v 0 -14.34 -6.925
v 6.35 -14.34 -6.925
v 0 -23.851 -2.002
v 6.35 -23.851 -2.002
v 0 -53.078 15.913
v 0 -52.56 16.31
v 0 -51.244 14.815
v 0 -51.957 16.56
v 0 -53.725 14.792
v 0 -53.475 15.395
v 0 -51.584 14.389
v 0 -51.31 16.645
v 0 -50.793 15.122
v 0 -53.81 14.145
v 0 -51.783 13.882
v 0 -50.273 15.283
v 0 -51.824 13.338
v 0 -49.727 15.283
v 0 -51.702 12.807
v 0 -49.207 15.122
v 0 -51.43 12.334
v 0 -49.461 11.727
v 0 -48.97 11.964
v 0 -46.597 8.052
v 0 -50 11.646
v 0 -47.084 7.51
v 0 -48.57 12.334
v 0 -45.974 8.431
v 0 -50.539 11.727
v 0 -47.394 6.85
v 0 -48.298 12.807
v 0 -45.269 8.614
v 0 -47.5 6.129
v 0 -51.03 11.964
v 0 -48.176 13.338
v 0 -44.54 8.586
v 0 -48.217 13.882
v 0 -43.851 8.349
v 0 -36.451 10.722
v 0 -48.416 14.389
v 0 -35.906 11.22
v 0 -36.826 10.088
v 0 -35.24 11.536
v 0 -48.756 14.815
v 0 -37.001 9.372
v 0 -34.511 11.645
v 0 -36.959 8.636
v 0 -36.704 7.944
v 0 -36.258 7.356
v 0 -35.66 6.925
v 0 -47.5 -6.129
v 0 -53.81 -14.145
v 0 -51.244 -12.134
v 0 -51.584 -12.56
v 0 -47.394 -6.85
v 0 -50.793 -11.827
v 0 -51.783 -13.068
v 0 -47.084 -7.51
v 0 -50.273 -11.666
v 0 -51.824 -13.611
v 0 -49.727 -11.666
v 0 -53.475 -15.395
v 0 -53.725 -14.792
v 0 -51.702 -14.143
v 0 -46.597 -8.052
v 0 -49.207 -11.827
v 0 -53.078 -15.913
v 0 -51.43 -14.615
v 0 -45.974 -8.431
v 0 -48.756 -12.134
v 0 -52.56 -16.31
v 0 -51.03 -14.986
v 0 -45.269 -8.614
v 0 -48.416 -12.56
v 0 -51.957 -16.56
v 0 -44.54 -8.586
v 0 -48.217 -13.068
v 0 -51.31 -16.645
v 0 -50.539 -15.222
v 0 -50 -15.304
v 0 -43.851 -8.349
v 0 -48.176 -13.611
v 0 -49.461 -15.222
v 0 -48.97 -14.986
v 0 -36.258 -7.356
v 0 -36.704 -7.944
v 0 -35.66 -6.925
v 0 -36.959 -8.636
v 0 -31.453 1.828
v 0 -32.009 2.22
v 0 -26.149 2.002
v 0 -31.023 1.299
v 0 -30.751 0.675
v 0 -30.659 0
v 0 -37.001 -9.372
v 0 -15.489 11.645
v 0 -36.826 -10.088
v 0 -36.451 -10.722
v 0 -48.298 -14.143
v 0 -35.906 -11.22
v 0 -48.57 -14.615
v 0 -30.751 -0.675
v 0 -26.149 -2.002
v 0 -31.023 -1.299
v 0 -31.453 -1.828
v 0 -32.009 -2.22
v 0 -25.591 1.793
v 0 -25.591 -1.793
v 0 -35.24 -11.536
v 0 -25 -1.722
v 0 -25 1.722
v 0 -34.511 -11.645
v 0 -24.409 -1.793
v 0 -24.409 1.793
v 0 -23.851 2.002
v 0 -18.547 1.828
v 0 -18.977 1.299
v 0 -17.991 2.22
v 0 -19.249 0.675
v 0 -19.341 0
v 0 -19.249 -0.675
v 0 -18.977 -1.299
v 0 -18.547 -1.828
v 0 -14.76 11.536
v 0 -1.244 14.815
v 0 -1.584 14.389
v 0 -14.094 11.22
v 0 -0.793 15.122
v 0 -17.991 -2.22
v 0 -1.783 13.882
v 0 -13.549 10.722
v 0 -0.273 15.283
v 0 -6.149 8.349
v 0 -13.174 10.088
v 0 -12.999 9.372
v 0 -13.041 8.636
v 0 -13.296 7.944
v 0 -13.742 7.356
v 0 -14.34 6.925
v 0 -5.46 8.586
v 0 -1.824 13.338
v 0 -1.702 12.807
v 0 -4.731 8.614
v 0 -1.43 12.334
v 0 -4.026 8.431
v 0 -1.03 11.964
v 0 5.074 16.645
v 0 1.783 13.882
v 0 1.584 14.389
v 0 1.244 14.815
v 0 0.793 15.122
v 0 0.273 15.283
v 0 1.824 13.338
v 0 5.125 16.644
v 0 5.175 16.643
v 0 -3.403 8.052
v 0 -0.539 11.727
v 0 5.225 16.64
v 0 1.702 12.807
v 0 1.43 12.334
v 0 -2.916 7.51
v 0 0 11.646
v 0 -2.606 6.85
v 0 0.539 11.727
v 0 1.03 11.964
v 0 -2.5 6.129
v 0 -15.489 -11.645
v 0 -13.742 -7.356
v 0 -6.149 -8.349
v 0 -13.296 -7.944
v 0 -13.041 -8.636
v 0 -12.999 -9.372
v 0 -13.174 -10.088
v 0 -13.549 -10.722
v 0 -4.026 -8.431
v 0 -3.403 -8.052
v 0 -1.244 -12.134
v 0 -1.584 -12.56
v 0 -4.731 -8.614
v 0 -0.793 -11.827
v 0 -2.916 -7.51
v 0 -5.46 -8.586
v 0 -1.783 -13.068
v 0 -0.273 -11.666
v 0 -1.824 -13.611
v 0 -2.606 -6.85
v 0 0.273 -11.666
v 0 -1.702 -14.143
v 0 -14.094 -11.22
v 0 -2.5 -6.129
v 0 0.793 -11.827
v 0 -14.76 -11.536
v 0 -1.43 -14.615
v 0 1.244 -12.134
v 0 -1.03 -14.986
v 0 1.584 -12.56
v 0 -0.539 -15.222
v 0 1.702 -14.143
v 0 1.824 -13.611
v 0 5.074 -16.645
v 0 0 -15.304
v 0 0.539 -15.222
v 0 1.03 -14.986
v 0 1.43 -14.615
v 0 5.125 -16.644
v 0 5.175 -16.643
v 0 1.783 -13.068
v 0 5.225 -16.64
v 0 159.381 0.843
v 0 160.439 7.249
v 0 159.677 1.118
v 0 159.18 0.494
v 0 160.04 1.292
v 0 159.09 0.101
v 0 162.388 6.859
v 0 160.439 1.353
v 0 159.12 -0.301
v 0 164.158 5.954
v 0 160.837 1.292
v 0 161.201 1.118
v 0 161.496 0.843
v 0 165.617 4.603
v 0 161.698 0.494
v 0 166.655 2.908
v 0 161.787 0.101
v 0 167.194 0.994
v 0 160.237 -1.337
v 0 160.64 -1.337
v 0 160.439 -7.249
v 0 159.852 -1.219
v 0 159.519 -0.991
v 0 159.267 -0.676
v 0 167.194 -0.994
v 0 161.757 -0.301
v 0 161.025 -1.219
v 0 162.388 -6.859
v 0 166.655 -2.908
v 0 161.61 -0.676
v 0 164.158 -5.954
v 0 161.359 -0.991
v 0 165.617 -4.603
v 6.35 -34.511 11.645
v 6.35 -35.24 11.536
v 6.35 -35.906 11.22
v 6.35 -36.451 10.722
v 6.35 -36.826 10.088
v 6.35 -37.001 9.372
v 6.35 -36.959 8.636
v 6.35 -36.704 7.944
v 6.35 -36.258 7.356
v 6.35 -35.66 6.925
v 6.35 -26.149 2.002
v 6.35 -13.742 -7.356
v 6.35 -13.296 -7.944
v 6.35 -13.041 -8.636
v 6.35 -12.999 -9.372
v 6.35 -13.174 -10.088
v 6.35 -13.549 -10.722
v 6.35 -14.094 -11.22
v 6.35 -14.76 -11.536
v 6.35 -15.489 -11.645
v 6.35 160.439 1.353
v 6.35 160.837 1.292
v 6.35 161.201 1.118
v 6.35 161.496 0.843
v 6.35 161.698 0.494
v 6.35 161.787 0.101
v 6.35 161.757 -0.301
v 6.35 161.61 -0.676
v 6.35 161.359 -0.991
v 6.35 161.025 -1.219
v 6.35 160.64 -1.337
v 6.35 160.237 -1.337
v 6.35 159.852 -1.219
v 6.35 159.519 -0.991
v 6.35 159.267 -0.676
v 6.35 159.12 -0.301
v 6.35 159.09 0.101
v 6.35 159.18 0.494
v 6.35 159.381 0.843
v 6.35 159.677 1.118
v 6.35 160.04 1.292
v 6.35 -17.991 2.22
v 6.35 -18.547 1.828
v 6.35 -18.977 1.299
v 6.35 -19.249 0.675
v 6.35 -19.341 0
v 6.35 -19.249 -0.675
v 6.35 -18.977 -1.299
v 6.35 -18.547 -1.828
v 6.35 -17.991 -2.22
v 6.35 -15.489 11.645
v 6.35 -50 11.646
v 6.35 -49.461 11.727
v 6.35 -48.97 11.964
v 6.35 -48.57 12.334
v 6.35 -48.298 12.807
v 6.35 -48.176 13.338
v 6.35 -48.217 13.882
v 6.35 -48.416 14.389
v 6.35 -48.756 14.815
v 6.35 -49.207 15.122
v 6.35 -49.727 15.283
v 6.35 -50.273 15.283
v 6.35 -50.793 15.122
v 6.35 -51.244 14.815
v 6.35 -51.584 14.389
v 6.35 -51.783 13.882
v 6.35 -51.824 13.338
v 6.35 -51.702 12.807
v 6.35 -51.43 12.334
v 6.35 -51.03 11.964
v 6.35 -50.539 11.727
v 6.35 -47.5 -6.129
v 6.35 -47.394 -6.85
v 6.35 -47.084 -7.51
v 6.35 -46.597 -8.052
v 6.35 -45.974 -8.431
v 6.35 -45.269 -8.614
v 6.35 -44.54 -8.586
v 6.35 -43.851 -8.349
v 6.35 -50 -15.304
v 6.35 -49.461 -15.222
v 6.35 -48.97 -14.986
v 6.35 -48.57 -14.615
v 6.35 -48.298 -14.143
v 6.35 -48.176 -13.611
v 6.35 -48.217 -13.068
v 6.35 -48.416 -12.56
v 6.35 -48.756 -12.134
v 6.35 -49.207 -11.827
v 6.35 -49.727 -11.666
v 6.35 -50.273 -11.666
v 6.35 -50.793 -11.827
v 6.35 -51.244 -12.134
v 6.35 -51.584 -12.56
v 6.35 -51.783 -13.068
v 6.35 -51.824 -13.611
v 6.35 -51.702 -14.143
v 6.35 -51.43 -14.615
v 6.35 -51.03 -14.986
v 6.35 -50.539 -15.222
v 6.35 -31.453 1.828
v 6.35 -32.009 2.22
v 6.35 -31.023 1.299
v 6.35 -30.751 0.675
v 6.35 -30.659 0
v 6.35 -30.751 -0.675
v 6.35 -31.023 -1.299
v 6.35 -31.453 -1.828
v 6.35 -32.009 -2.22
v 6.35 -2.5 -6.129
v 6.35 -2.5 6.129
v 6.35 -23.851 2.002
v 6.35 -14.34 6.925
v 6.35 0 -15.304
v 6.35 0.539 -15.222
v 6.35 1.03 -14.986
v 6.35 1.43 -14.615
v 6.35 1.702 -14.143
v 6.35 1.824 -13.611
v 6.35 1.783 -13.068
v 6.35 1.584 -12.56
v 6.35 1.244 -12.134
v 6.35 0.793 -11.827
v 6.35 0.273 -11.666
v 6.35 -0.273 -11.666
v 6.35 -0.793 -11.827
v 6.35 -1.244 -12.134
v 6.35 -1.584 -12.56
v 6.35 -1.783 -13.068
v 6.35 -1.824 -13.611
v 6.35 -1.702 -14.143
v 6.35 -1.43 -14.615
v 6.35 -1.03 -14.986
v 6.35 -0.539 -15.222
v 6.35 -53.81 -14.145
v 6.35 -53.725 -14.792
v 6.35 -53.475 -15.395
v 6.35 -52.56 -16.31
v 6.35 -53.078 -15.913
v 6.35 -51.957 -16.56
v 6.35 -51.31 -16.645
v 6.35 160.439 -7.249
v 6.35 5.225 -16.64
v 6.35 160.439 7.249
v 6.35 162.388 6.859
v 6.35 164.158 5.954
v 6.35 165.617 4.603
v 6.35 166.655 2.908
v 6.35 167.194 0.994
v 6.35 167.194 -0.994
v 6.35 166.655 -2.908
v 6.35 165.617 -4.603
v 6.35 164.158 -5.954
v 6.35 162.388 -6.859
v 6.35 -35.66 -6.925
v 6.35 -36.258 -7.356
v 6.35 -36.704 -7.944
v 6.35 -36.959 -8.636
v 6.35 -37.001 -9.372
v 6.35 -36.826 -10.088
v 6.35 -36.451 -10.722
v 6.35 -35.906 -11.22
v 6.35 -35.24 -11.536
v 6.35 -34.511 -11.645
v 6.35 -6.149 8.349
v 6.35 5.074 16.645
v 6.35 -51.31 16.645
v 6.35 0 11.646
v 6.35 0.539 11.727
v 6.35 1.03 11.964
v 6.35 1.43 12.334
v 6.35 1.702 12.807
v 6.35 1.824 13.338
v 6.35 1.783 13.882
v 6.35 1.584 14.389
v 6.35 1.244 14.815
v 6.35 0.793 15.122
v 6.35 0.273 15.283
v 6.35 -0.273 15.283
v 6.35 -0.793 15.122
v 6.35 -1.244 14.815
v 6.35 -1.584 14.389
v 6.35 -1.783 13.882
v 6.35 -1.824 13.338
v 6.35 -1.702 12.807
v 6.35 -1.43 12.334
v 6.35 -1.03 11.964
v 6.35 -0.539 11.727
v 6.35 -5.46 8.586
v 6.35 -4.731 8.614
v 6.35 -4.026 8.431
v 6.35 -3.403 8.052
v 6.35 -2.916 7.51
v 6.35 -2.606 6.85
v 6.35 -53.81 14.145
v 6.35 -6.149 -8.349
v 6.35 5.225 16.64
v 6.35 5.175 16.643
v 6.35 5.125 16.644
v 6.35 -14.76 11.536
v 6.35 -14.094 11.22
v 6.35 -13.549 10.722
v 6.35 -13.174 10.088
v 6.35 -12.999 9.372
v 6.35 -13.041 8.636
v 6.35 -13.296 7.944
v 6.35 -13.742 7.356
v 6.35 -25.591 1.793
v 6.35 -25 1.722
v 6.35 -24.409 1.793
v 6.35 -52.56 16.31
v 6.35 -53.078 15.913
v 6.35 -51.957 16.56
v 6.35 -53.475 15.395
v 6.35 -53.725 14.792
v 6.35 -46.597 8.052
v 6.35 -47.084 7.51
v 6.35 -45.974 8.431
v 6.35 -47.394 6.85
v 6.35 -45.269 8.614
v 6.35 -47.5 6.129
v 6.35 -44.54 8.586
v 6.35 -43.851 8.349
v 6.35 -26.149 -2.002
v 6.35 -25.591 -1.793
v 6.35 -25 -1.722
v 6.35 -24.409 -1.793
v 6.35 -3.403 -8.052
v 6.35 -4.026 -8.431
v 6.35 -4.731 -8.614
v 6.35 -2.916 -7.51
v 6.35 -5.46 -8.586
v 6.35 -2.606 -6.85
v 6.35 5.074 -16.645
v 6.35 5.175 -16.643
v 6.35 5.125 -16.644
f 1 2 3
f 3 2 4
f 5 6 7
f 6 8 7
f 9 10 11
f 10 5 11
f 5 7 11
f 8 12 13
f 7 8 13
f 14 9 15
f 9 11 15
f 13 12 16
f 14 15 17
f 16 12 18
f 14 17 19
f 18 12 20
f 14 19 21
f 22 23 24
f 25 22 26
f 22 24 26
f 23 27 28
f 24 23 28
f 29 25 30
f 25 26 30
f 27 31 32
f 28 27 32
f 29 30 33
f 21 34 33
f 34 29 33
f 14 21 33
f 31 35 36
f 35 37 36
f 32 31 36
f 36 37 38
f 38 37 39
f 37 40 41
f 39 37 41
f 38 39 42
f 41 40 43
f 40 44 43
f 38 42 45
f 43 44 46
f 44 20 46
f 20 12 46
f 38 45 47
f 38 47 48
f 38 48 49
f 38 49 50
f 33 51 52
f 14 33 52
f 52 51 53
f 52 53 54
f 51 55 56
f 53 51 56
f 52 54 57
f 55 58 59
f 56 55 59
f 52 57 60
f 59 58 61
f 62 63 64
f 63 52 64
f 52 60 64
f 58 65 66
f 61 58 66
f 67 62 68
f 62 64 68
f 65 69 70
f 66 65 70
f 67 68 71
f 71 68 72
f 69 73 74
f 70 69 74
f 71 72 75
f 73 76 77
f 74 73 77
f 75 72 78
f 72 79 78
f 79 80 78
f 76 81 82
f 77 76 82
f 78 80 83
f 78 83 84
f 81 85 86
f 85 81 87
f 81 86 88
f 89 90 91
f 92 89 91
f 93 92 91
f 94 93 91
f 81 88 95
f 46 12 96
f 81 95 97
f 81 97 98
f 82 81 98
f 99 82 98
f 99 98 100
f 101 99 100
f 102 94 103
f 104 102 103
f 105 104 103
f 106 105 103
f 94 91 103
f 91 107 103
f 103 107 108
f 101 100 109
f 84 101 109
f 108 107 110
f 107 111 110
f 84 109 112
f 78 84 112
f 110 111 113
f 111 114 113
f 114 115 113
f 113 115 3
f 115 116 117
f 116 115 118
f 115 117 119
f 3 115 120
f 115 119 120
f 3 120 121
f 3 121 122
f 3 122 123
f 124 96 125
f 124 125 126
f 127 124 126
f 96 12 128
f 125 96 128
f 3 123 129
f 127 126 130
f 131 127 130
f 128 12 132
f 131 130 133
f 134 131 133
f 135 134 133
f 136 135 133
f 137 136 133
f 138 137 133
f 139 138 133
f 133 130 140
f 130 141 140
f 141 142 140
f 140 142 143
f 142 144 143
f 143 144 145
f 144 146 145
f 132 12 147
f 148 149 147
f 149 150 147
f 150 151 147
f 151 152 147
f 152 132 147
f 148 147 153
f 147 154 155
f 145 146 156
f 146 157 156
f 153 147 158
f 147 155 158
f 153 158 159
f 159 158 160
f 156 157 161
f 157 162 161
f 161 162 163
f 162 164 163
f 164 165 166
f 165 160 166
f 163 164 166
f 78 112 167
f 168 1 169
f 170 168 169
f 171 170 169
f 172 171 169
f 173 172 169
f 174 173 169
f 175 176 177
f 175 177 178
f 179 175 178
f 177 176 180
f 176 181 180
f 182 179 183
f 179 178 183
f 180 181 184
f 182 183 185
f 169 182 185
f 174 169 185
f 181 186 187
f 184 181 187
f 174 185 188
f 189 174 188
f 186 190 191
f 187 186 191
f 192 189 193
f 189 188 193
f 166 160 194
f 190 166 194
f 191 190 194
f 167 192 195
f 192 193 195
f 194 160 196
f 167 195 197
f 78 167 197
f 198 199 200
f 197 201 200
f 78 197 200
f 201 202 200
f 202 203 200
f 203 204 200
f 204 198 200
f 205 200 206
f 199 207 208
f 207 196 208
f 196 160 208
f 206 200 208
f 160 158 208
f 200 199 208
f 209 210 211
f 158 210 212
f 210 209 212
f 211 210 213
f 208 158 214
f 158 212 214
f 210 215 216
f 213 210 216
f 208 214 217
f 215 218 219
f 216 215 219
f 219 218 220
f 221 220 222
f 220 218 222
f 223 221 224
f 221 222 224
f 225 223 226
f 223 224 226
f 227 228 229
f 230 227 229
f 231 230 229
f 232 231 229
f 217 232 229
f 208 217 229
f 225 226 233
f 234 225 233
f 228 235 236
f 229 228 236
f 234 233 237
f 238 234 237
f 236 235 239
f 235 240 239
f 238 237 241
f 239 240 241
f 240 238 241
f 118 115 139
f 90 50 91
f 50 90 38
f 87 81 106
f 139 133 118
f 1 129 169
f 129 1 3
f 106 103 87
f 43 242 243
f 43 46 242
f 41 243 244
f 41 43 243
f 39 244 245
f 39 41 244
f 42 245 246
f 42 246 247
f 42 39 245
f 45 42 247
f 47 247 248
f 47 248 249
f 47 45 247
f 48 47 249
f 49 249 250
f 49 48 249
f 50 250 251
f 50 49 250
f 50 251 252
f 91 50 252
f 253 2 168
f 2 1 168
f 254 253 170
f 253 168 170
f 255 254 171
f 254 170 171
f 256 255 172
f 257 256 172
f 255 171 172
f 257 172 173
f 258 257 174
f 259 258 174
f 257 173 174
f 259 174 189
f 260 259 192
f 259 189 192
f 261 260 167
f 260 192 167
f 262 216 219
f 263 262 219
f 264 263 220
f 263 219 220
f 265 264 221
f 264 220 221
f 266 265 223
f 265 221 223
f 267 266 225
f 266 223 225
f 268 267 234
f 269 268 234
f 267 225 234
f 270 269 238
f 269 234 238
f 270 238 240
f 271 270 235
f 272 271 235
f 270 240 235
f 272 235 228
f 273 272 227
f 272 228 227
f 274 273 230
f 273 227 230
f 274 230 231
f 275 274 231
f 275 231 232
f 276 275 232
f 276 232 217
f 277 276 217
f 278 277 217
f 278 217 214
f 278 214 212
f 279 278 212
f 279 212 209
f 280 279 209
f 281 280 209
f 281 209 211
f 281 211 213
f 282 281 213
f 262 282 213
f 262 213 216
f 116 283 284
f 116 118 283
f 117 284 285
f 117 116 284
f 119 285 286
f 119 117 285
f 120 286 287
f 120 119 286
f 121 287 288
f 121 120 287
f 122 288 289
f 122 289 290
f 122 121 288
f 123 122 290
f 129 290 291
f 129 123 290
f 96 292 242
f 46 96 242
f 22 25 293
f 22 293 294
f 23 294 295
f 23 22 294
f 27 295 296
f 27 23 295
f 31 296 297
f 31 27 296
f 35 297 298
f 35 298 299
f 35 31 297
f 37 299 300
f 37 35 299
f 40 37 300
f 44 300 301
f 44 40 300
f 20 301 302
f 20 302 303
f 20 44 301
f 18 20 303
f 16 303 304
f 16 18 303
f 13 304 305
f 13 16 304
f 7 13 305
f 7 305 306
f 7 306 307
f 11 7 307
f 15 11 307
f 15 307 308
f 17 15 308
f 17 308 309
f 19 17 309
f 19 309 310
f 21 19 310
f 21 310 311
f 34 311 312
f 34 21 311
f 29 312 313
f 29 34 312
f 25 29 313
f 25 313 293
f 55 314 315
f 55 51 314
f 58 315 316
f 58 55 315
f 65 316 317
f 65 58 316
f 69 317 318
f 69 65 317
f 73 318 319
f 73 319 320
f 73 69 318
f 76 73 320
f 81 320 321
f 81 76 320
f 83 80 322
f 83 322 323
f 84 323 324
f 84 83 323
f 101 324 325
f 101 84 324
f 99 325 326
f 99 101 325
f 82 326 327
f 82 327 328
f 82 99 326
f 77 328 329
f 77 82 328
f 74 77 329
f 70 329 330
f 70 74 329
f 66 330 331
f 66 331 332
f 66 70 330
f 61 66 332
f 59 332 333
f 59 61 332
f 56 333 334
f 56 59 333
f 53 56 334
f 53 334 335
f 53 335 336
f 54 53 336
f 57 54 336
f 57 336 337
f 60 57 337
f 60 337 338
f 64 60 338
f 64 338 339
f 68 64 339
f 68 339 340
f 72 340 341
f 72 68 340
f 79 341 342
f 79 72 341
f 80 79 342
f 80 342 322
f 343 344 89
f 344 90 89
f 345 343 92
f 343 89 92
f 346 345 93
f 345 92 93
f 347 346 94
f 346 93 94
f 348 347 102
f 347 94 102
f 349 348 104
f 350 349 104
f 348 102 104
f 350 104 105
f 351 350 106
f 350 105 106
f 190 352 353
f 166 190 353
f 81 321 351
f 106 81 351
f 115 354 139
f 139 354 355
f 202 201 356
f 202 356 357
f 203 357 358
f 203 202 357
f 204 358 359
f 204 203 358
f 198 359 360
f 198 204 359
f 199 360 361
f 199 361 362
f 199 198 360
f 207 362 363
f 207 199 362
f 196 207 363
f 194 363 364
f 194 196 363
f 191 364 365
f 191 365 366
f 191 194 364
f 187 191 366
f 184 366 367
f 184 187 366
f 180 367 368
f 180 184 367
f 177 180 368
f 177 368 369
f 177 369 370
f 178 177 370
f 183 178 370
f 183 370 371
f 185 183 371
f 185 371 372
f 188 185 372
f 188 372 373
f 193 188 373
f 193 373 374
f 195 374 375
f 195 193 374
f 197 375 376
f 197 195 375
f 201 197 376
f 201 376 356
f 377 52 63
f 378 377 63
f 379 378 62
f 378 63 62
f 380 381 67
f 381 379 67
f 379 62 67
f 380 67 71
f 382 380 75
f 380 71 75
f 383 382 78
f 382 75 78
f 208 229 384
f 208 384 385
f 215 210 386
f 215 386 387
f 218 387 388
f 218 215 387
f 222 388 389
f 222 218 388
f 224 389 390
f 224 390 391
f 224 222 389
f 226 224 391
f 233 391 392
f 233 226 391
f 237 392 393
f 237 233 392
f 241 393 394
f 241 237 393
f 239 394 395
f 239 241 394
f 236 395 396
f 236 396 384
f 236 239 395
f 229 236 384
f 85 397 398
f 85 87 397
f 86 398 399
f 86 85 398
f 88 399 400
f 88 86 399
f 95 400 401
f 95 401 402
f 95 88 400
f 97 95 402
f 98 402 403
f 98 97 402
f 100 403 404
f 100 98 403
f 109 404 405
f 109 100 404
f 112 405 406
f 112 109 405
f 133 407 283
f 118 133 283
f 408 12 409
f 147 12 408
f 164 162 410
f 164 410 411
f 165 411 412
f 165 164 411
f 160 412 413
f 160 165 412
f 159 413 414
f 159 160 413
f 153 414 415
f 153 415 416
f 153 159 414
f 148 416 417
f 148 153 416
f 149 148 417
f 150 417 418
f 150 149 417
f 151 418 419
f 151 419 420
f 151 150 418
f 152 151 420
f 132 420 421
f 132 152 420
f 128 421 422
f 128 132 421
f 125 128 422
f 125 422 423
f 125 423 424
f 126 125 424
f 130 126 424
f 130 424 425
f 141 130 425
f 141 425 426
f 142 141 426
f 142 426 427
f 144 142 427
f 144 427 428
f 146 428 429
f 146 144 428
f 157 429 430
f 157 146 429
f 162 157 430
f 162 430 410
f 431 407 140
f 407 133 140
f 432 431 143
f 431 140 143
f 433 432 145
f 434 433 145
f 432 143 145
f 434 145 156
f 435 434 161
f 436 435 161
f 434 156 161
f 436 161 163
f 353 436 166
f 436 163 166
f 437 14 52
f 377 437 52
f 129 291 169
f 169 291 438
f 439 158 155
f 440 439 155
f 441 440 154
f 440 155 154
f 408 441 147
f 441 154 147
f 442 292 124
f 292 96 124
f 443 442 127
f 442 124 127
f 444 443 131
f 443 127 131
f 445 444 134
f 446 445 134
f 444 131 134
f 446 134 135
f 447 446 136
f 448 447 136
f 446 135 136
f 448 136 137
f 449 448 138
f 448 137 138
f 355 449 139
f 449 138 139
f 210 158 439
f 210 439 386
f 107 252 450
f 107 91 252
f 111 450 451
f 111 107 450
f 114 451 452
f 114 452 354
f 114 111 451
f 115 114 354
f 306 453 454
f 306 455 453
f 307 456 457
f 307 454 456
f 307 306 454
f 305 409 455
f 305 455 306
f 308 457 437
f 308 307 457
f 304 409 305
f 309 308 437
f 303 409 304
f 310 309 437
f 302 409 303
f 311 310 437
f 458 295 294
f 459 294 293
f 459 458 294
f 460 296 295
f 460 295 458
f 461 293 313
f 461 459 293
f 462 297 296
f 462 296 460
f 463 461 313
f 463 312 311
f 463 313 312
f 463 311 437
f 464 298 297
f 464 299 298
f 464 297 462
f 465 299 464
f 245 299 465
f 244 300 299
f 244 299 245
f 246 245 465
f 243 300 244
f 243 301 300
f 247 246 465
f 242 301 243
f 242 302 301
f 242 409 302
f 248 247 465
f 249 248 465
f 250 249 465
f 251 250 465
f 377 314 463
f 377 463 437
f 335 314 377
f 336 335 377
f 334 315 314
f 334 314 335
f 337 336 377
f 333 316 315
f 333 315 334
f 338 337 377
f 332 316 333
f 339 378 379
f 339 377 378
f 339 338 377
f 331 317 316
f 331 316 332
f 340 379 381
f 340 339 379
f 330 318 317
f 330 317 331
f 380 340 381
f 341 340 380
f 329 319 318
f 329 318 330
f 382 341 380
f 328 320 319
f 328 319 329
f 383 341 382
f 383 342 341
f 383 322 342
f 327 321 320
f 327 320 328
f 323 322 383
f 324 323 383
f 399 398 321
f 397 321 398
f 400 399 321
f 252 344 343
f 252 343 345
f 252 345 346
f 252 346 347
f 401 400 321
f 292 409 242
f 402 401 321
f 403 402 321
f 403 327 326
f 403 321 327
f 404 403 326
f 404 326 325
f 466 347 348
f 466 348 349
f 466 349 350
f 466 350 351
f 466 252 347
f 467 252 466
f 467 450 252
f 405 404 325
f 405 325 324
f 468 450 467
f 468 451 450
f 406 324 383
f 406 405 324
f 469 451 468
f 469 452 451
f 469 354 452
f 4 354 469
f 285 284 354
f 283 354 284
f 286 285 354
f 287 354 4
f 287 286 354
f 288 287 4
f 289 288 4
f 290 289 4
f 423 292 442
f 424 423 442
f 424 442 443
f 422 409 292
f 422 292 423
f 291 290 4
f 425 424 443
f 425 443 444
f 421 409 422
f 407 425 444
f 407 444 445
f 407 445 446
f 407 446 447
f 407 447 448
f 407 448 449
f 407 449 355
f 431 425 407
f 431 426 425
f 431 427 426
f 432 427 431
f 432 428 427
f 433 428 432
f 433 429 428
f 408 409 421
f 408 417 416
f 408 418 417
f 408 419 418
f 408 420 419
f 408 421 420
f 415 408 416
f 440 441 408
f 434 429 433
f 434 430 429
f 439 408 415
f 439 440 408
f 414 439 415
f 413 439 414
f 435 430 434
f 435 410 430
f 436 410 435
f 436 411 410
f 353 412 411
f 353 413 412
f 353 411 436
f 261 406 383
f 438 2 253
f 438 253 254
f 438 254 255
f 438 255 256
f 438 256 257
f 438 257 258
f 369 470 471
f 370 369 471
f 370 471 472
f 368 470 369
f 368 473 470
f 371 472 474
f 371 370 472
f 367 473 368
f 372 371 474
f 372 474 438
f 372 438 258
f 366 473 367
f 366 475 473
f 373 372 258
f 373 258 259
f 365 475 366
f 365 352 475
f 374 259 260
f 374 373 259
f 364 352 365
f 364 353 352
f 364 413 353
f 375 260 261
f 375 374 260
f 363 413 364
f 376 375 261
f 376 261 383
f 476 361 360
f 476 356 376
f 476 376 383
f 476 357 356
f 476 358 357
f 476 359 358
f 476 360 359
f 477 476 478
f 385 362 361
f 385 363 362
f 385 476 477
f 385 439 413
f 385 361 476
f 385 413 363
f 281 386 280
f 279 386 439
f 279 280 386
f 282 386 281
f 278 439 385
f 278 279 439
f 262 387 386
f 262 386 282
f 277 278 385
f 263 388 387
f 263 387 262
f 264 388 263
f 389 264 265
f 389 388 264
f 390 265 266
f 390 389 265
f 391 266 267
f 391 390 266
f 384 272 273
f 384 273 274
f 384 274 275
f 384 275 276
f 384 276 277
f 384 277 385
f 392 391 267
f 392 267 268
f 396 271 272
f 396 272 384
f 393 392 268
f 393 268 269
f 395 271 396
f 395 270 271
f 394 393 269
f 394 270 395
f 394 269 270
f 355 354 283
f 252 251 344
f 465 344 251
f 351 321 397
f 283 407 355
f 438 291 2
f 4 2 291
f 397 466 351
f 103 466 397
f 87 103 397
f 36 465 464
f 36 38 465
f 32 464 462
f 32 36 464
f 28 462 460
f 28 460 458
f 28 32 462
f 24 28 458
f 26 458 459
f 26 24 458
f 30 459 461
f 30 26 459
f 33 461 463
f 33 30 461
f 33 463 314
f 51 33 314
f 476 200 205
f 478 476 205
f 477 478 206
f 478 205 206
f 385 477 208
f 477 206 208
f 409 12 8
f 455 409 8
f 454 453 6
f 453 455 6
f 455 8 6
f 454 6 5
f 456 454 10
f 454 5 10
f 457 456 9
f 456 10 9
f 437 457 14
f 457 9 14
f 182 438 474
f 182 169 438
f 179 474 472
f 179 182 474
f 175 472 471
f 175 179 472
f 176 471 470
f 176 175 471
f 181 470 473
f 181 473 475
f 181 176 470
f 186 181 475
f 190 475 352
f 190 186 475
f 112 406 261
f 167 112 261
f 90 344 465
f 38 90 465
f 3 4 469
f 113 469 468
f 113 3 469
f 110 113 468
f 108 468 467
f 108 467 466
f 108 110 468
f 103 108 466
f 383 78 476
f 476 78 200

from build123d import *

# Parameters (mm, degrees)
SKETCH1_W             = 33.29
SKETCH1_H             = 58.96
SKETCH1_R             = 1.8288
BOSS_EXTRUDE1_DEPTH   = 6.35
CUT_EXTRUDE1_DEPTH    = 169.208568246
FILLET1_R             = 2.5
FILLET2_R             = 2.5
F_6_32_TAPPED_HOLE1_D = 2.7051


with BuildPart() as part:
    # Sketch1 → Boss-Extrude1 (new body)
    # profile 1 of 2: a face of its own
    with BuildSketch(Plane(origin=(0, 0, 0), x_dir=(0, 0, -1), z_dir=(1, 0, 0))):
        with BuildLine():
            ThreePointArc((-7.249242854, 160.438616345), (0, 167.2625), (7.249242854, 160.438616345))
            Line((7.249242854, 160.438616345), (16.645, 5.15))
            Line((16.645, 5.15), (-16.645, 5.15))
            Line((-16.645, 5.15), (-7.249242854, 160.438616345))
        make_face()
    # profile 2 of 2: a face of its own
    with BuildSketch(Plane(origin=(0, 0, 0), x_dir=(0, 0, -1), z_dir=(1, 0, 0))):
        with Locations((0, -24.33)):
            Rectangle(SKETCH1_W, SKETCH1_H)
        with Locations((13.4747, -50)):
            Circle(SKETCH1_R, mode=Mode.SUBTRACT)
        with Locations((-13.4747, -50)):
            Circle(SKETCH1_R, mode=Mode.SUBTRACT)
        with Locations((13.4747, 0)):
            Circle(SKETCH1_R, mode=Mode.SUBTRACT)
        with Locations((-13.4747, 0)):
            Circle(SKETCH1_R, mode=Mode.SUBTRACT)
    extrude(amount=BOSS_EXTRUDE1_DEPTH)

    # Sketch2 → Cut-Extrude1 (cut, through all)
    with BuildSketch(Plane(origin=(6.35, 0, 0), x_dir=(0, 0, -1), z_dir=(1, 0, 0))):
        Polygon((11.645, -5.219501679), (1.407493202, -25), (11.645, -44.780498321), align=None)
        Polygon((0, -27.719501679), (-10.237506798, -47.5), (10.237506798, -47.5), align=None)
        Polygon((-11.645, -5.219501679), (-11.645, -44.780498321), (-1.407493202, -25), align=None)
        Polygon((-10.237506798, -2.5), (0, -22.280498321), (10.237506798, -2.5), align=None)
    extrude(amount=-CUT_EXTRUDE1_DEPTH, mode=Mode.SUBTRACT)

    # Fillet1
    fillet1_edges = [part.edges().sort_by_distance(p)[0] for p in [
        (3.175, -44.780498321, 11.645),
        (3.175, -5.219501679, 11.645),
        (3.175, -25, 1.407493202),
        (3.175, -47.5, -10.237506798),
        (3.175, -47.5, 10.237506798),
        (3.175, -27.719501679, 0),
        (3.175, -22.280498321, 0),
        (3.175, -2.5, 10.237506798),
        (3.175, -2.5, -10.237506798),
        (3.175, -25, -1.407493202),
        (3.175, -5.219501679, -11.645),
        (3.175, -44.780498321, -11.645),
    ]]
    fillet(fillet1_edges, radius=FILLET1_R)

    # Fillet2
    # the kernel refuses this fillet: 2.5 mm, written as the material it takes off along each edge
    with BuildSketch(Plane(origin=(-0.188905784, 5.15, -16.645), x_dir=(0, 0.9981745753787551, 0.06039467747609822), z_dir=(1, 0, 0))) as fillet2_piece_1:
        with BuildLine():
            CenterArc((FILLET2_R * 0.0302249253995, FILLET2_R), FILLET2_R, 266.537532795, 3.462467205)
            Line((-FILLET2_R * 0.0301697520766, FILLET2_R * 0.00182542462124), (0, 0))
            Line((0, 0), (FILLET2_R * 0.0302249253996, 0))
        make_face()
    extrude(amount=6.727811567, mode=Mode.SUBTRACT)
    with BuildSketch(Plane(origin=(-6.25, -53.81, -16.645), x_dir=(0, 1, 0), z_dir=(1, 0, 0))) as fillet2_piece_2:
        with BuildLine():
            CenterArc((FILLET2_R, FILLET2_R), FILLET2_R, 180, 90)
            Line((0, FILLET2_R), (0, 0))
            Line((0, 0), (FILLET2_R, 0))
        make_face()
    extrude(amount=18.85, mode=Mode.SUBTRACT)
    with BuildSketch(Plane(origin=(-6.25, -53.81, 16.645), x_dir=(0, 1, 0), z_dir=(1, 0, 0))) as fillet2_piece_3:
        with BuildLine():
            CenterArc((FILLET2_R, -FILLET2_R), FILLET2_R, 90, 90)
            Line((0, -FILLET2_R), (0, 0))
            Line((0, 0), (FILLET2_R, 0))
        make_face()
    extrude(amount=18.85, mode=Mode.SUBTRACT)
    with BuildSketch(Plane(origin=(-0.188905784, 5.15, 16.645), x_dir=(0, 0.9981745753787543, -0.06039467747611318), z_dir=(1, 0, 0))) as fillet2_piece_4:
        with BuildLine():
            CenterArc((FILLET2_R * 0.0302249253995, -FILLET2_R), FILLET2_R, 90, 3.462467205)
            Line((-FILLET2_R * 0.0301697520766, -FILLET2_R * 0.00182542462124), (0, 0))
            Line((0, 0), (FILLET2_R * 0.0302249253996, 0))
        make_face()
    extrude(amount=6.727811567, mode=Mode.SUBTRACT)

    # #6-32 Tapped Hole1 (through all)
    with Locations(Plane(origin=(6.35, 0, 0), x_dir=(0, 0, -1), z_dir=(1, 0, 0))):
        with Locations((0, 160.438616345)):
            Hole(F_6_32_TAPPED_HOLE1_D / 2)


solid = part.part
